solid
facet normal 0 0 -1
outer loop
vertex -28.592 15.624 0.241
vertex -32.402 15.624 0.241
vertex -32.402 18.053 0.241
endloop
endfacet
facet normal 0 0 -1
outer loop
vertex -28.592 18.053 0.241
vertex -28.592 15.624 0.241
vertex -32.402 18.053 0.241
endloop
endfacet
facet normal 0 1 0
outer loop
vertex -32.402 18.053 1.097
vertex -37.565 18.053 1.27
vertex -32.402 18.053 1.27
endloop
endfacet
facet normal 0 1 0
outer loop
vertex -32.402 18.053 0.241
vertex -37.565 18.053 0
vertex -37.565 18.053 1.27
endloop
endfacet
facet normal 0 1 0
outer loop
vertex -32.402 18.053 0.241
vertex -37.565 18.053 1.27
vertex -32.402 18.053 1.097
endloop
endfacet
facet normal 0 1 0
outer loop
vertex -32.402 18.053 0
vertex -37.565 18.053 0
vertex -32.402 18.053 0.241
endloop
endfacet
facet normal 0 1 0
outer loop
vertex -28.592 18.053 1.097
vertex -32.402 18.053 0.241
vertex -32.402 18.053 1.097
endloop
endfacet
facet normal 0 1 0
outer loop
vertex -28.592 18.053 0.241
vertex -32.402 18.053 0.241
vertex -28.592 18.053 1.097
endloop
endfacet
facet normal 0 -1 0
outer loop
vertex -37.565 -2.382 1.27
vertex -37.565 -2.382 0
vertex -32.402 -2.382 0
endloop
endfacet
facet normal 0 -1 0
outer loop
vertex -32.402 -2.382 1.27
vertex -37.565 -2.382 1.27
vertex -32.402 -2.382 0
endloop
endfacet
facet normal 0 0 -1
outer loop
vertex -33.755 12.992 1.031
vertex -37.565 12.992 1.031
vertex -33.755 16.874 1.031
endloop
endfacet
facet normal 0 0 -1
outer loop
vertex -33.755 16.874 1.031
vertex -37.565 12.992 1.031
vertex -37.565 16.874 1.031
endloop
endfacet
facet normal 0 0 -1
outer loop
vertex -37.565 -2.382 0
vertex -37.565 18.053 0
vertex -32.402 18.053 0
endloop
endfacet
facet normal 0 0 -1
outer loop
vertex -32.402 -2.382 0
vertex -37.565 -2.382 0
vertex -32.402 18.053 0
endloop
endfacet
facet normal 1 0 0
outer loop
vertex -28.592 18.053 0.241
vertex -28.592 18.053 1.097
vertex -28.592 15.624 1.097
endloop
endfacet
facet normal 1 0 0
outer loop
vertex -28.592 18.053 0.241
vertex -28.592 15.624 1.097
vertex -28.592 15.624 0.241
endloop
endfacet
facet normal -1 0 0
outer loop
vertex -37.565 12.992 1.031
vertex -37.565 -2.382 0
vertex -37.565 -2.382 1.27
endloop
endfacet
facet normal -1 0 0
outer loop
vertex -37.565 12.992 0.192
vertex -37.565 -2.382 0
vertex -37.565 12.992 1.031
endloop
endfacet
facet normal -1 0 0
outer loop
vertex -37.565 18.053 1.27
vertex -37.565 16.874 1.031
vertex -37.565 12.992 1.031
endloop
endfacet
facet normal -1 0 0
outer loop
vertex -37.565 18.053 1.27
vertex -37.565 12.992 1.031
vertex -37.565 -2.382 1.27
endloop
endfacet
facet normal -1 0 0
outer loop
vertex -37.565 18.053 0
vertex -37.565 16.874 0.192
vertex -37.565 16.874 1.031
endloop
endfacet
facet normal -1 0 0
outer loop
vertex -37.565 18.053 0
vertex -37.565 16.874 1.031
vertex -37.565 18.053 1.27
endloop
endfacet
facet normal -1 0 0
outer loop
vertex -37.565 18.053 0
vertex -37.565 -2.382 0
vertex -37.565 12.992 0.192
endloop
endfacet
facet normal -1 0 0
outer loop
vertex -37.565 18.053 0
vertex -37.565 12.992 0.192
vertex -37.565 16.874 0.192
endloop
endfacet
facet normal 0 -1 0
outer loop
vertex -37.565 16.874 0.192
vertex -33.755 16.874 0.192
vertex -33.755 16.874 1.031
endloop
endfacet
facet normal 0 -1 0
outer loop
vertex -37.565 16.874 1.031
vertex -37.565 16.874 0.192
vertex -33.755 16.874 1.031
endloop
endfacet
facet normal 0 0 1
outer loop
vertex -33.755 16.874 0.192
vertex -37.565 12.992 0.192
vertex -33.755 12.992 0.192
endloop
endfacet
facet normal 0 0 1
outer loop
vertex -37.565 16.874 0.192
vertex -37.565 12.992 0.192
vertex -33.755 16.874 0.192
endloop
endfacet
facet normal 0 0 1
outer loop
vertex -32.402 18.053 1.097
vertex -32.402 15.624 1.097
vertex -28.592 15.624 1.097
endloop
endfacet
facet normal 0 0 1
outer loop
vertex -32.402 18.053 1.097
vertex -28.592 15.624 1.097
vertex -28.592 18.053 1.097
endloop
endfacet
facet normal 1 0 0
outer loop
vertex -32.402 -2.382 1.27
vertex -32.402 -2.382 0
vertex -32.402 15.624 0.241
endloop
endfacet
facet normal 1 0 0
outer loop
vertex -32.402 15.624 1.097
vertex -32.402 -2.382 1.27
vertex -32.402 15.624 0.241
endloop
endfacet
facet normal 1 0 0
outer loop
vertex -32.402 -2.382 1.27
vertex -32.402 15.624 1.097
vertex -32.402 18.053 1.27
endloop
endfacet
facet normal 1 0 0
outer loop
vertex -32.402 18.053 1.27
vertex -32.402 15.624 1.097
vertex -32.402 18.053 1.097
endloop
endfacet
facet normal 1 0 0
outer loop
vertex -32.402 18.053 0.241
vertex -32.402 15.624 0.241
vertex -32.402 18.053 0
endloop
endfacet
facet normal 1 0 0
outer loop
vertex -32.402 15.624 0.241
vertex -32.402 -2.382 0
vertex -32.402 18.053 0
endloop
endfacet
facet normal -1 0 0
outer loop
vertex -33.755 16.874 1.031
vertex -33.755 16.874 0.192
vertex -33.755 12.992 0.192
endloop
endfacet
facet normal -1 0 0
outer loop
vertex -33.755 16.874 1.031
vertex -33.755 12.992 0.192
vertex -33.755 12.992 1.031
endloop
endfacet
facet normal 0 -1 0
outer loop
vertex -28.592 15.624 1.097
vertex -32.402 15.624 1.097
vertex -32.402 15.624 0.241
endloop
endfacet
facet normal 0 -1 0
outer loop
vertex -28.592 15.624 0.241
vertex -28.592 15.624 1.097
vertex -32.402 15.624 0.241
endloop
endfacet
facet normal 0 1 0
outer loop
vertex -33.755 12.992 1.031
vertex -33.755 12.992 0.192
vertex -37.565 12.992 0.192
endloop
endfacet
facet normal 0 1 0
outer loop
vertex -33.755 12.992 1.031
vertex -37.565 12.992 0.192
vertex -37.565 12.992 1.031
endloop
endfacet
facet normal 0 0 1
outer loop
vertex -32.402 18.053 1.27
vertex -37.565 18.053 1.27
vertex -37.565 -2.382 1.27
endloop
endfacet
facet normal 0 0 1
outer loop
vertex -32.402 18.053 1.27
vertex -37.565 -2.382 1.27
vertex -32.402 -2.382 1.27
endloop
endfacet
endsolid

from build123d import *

# Parameters (mm, degrees)
SKETCH1_W           = 5.162383308
SKETCH1_H           = 20.435052184
BOSS_EXTRUDE1_DEPTH = 1.27
SKETCH2_W           = 0.838933851
SKETCH2_H           = 3.882140463
CUT_EXTRUDE1_DEPTH  = 3.81
SKETCH3_W           = 0.856262928
SKETCH3_H           = 2.429514696
BOSS_EXTRUDE2_DEPTH = 3.81


with BuildPart() as part:
    # Sketch1 → Boss-Extrude1 (new body)
    with BuildSketch(Plane.XY):
        with Locations((-34.98361032, 7.835499756)):
            Rectangle(SKETCH1_W, SKETCH1_H)
    extrude(amount=BOSS_EXTRUDE1_DEPTH)

    # Sketch2 → Cut-Extrude1 (cut)
    with BuildSketch(Plane.ZY.offset(37.564801974)):
        with Locations((0.611191145, 14.932897959)):
            Rectangle(SKETCH2_W, SKETCH2_H)
    extrude(amount=-CUT_EXTRUDE1_DEPTH, mode=Mode.SUBTRACT)

    # Sketch3 → Boss-Extrude2 (add)
    with BuildSketch(Plane(origin=(-32.402418666, 0, 0), x_dir=(0, 0, -1), z_dir=(1, 0, 0))):
        with Locations((-0.669030721, 16.8382685)):
            Rectangle(SKETCH3_W, SKETCH3_H)
    extrude(amount=BOSS_EXTRUDE2_DEPTH)


solid = part.part
